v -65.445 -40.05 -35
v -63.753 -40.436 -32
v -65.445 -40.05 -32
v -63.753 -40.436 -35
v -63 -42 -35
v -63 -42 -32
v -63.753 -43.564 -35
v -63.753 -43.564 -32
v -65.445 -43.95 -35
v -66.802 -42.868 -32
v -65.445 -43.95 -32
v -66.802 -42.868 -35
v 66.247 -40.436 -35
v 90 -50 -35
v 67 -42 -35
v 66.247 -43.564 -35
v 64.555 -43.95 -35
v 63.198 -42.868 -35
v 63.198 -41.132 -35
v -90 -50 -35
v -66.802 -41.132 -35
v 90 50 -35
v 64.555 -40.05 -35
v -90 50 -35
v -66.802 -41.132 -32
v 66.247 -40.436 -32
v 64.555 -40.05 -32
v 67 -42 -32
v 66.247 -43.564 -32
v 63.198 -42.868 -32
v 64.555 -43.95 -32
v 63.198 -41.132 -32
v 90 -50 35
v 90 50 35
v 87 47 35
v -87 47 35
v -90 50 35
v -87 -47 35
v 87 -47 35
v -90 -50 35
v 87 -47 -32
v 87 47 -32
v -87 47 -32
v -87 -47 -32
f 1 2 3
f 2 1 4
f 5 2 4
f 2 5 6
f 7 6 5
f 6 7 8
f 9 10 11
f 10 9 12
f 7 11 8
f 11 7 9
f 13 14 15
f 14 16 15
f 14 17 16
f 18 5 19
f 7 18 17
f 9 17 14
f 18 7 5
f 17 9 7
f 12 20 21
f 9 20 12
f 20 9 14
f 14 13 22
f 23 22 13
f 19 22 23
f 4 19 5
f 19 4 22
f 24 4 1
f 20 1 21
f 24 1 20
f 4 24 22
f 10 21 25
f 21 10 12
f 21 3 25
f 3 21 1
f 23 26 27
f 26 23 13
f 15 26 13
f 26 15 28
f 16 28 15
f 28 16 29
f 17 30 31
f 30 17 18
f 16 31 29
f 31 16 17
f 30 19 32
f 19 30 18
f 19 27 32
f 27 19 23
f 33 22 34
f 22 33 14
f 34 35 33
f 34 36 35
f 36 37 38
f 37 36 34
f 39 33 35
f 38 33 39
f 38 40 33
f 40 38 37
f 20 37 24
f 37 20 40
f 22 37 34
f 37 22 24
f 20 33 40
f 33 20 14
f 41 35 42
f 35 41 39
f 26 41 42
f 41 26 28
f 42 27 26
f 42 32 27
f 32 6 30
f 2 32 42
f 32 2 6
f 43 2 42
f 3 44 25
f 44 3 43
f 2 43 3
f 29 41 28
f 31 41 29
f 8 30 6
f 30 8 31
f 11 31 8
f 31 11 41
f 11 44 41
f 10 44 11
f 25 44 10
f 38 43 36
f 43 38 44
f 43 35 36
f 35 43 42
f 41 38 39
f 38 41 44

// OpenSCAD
// ARMOR-HARDWARE parametric field-node enclosure.
// Copyright (C) 2026 JuanenRac (Electro Hobby 3D). CERN-OHL-S-2.0.
width=180; depth=100; height=70; wall=3; drain_diameter=4;
difference(){ cube([width,depth,height],center=true); translate([0,0,wall]) cube([width-2*wall,depth-2*wall,height],center=true); for(x=[-65,65]) translate([x,-42,-height/2]) cylinder(h=wall+1,d=drain_diameter); }
